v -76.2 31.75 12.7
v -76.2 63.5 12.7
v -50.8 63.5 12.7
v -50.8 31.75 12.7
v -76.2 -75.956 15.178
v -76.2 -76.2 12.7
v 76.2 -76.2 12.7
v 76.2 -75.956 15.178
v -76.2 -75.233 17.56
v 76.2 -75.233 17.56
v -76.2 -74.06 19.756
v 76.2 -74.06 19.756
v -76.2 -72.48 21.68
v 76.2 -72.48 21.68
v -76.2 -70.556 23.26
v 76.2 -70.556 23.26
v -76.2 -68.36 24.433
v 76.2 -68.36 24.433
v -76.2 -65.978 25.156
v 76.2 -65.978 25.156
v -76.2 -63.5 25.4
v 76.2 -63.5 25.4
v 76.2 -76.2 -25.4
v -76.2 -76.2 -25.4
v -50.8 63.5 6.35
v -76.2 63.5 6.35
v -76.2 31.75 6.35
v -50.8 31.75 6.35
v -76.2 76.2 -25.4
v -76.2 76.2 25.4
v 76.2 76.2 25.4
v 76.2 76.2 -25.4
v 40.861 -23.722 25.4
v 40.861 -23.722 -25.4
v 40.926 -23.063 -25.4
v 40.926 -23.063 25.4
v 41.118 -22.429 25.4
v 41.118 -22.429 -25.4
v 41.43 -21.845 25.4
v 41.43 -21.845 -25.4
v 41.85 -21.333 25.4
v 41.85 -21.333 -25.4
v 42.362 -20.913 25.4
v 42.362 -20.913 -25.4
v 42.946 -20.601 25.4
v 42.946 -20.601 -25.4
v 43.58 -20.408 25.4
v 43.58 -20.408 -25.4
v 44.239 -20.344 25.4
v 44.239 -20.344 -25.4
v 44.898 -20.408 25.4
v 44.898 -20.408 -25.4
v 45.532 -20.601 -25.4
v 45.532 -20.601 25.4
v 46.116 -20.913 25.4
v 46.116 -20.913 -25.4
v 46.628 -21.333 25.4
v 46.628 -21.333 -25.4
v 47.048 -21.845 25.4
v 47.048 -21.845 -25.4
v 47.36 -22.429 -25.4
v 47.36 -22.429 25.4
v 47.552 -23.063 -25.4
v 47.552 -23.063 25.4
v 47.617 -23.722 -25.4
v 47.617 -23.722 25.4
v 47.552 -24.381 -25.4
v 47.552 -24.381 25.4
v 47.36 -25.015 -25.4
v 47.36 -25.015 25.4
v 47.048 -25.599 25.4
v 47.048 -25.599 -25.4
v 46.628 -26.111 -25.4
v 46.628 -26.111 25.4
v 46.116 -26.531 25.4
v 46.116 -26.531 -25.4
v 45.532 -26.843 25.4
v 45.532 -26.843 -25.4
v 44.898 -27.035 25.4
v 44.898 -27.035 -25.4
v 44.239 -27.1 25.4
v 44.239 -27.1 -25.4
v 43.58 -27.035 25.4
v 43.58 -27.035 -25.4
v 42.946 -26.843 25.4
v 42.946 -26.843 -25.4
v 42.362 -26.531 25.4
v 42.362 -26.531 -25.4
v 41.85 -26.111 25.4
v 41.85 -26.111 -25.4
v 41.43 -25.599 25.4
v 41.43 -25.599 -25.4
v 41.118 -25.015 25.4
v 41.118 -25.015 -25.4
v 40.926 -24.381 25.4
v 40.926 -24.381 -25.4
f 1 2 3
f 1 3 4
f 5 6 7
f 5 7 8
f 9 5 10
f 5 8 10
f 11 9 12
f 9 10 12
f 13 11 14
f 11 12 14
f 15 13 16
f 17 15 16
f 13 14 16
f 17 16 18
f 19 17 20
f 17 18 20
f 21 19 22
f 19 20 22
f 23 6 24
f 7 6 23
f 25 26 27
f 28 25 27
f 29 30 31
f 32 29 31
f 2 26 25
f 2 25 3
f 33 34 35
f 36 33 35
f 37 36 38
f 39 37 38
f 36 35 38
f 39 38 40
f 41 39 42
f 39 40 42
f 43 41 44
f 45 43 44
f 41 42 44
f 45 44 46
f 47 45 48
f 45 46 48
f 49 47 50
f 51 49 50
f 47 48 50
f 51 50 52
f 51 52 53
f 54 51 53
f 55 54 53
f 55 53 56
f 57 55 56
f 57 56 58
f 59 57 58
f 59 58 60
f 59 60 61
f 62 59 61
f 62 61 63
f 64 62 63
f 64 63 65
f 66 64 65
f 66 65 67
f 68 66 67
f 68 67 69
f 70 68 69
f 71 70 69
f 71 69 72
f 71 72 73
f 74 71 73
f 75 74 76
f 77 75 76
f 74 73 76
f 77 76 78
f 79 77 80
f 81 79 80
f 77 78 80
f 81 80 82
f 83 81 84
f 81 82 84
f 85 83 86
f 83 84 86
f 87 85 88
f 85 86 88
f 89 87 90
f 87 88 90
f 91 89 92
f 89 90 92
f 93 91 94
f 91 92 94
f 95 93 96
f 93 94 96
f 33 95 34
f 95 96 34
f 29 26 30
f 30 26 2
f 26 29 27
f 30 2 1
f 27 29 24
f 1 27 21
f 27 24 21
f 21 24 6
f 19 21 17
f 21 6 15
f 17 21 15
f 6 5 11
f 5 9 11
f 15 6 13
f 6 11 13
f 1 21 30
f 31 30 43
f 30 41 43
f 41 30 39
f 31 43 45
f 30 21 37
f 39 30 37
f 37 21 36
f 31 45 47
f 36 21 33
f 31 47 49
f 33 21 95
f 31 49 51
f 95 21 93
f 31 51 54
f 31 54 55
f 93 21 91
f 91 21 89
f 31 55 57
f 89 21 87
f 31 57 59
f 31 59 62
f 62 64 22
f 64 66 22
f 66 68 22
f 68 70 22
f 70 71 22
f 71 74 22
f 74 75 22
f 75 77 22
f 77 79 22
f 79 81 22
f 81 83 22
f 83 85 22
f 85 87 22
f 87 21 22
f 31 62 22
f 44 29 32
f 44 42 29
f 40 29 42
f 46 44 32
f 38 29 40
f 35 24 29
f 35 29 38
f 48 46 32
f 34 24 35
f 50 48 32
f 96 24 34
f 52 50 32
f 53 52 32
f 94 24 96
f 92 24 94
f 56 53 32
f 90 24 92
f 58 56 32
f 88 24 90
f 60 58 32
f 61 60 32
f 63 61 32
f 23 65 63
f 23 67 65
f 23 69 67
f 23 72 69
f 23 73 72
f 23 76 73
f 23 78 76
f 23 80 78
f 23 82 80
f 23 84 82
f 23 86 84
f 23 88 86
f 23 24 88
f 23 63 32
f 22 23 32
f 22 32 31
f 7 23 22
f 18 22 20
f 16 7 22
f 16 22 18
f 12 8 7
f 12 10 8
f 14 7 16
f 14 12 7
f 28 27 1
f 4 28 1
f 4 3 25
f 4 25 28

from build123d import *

# Parameters (mm, degrees)
F0_W     = 152.4
F0_H     = 50.8
F1_DEPTH = 76.2
F2_R     = 12.7
F4_D     = 6.7564
F5_W     = 31.75
F5_H     = 6.35
F6_DEPTH = 25.4


with BuildPart() as f1:
    # F0 (on Front) → F1 (new body, symmetric)
    with BuildSketch(Plane.XZ):
        Rectangle(F0_W, F0_H)
    extrude(amount=F1_DEPTH, both=True)

    # F2
    f2_edges = [f1.edges().sort_by_distance(p)[0] for p in [
        (0, -76.2, 25.4),
    ]]
    fillet(f2_edges, radius=F2_R)

    # F4 (through all)
    with Locations(Plane.XY.offset(25.4)):
        with Locations((44.2391075194, -23.7217675894)):
            Hole(F4_D / 2)

    # F5 (on face) → F6 (cut)
    with BuildSketch(Plane(origin=(-76.2, 0, 0), x_dir=(0, -1, 0), z_dir=(-1, 0, 0))):
        with Locations((-47.625, 9.525)):
            Rectangle(F5_W, F5_H)
    extrude(amount=-F6_DEPTH, mode=Mode.SUBTRACT)


solid = f1.part
